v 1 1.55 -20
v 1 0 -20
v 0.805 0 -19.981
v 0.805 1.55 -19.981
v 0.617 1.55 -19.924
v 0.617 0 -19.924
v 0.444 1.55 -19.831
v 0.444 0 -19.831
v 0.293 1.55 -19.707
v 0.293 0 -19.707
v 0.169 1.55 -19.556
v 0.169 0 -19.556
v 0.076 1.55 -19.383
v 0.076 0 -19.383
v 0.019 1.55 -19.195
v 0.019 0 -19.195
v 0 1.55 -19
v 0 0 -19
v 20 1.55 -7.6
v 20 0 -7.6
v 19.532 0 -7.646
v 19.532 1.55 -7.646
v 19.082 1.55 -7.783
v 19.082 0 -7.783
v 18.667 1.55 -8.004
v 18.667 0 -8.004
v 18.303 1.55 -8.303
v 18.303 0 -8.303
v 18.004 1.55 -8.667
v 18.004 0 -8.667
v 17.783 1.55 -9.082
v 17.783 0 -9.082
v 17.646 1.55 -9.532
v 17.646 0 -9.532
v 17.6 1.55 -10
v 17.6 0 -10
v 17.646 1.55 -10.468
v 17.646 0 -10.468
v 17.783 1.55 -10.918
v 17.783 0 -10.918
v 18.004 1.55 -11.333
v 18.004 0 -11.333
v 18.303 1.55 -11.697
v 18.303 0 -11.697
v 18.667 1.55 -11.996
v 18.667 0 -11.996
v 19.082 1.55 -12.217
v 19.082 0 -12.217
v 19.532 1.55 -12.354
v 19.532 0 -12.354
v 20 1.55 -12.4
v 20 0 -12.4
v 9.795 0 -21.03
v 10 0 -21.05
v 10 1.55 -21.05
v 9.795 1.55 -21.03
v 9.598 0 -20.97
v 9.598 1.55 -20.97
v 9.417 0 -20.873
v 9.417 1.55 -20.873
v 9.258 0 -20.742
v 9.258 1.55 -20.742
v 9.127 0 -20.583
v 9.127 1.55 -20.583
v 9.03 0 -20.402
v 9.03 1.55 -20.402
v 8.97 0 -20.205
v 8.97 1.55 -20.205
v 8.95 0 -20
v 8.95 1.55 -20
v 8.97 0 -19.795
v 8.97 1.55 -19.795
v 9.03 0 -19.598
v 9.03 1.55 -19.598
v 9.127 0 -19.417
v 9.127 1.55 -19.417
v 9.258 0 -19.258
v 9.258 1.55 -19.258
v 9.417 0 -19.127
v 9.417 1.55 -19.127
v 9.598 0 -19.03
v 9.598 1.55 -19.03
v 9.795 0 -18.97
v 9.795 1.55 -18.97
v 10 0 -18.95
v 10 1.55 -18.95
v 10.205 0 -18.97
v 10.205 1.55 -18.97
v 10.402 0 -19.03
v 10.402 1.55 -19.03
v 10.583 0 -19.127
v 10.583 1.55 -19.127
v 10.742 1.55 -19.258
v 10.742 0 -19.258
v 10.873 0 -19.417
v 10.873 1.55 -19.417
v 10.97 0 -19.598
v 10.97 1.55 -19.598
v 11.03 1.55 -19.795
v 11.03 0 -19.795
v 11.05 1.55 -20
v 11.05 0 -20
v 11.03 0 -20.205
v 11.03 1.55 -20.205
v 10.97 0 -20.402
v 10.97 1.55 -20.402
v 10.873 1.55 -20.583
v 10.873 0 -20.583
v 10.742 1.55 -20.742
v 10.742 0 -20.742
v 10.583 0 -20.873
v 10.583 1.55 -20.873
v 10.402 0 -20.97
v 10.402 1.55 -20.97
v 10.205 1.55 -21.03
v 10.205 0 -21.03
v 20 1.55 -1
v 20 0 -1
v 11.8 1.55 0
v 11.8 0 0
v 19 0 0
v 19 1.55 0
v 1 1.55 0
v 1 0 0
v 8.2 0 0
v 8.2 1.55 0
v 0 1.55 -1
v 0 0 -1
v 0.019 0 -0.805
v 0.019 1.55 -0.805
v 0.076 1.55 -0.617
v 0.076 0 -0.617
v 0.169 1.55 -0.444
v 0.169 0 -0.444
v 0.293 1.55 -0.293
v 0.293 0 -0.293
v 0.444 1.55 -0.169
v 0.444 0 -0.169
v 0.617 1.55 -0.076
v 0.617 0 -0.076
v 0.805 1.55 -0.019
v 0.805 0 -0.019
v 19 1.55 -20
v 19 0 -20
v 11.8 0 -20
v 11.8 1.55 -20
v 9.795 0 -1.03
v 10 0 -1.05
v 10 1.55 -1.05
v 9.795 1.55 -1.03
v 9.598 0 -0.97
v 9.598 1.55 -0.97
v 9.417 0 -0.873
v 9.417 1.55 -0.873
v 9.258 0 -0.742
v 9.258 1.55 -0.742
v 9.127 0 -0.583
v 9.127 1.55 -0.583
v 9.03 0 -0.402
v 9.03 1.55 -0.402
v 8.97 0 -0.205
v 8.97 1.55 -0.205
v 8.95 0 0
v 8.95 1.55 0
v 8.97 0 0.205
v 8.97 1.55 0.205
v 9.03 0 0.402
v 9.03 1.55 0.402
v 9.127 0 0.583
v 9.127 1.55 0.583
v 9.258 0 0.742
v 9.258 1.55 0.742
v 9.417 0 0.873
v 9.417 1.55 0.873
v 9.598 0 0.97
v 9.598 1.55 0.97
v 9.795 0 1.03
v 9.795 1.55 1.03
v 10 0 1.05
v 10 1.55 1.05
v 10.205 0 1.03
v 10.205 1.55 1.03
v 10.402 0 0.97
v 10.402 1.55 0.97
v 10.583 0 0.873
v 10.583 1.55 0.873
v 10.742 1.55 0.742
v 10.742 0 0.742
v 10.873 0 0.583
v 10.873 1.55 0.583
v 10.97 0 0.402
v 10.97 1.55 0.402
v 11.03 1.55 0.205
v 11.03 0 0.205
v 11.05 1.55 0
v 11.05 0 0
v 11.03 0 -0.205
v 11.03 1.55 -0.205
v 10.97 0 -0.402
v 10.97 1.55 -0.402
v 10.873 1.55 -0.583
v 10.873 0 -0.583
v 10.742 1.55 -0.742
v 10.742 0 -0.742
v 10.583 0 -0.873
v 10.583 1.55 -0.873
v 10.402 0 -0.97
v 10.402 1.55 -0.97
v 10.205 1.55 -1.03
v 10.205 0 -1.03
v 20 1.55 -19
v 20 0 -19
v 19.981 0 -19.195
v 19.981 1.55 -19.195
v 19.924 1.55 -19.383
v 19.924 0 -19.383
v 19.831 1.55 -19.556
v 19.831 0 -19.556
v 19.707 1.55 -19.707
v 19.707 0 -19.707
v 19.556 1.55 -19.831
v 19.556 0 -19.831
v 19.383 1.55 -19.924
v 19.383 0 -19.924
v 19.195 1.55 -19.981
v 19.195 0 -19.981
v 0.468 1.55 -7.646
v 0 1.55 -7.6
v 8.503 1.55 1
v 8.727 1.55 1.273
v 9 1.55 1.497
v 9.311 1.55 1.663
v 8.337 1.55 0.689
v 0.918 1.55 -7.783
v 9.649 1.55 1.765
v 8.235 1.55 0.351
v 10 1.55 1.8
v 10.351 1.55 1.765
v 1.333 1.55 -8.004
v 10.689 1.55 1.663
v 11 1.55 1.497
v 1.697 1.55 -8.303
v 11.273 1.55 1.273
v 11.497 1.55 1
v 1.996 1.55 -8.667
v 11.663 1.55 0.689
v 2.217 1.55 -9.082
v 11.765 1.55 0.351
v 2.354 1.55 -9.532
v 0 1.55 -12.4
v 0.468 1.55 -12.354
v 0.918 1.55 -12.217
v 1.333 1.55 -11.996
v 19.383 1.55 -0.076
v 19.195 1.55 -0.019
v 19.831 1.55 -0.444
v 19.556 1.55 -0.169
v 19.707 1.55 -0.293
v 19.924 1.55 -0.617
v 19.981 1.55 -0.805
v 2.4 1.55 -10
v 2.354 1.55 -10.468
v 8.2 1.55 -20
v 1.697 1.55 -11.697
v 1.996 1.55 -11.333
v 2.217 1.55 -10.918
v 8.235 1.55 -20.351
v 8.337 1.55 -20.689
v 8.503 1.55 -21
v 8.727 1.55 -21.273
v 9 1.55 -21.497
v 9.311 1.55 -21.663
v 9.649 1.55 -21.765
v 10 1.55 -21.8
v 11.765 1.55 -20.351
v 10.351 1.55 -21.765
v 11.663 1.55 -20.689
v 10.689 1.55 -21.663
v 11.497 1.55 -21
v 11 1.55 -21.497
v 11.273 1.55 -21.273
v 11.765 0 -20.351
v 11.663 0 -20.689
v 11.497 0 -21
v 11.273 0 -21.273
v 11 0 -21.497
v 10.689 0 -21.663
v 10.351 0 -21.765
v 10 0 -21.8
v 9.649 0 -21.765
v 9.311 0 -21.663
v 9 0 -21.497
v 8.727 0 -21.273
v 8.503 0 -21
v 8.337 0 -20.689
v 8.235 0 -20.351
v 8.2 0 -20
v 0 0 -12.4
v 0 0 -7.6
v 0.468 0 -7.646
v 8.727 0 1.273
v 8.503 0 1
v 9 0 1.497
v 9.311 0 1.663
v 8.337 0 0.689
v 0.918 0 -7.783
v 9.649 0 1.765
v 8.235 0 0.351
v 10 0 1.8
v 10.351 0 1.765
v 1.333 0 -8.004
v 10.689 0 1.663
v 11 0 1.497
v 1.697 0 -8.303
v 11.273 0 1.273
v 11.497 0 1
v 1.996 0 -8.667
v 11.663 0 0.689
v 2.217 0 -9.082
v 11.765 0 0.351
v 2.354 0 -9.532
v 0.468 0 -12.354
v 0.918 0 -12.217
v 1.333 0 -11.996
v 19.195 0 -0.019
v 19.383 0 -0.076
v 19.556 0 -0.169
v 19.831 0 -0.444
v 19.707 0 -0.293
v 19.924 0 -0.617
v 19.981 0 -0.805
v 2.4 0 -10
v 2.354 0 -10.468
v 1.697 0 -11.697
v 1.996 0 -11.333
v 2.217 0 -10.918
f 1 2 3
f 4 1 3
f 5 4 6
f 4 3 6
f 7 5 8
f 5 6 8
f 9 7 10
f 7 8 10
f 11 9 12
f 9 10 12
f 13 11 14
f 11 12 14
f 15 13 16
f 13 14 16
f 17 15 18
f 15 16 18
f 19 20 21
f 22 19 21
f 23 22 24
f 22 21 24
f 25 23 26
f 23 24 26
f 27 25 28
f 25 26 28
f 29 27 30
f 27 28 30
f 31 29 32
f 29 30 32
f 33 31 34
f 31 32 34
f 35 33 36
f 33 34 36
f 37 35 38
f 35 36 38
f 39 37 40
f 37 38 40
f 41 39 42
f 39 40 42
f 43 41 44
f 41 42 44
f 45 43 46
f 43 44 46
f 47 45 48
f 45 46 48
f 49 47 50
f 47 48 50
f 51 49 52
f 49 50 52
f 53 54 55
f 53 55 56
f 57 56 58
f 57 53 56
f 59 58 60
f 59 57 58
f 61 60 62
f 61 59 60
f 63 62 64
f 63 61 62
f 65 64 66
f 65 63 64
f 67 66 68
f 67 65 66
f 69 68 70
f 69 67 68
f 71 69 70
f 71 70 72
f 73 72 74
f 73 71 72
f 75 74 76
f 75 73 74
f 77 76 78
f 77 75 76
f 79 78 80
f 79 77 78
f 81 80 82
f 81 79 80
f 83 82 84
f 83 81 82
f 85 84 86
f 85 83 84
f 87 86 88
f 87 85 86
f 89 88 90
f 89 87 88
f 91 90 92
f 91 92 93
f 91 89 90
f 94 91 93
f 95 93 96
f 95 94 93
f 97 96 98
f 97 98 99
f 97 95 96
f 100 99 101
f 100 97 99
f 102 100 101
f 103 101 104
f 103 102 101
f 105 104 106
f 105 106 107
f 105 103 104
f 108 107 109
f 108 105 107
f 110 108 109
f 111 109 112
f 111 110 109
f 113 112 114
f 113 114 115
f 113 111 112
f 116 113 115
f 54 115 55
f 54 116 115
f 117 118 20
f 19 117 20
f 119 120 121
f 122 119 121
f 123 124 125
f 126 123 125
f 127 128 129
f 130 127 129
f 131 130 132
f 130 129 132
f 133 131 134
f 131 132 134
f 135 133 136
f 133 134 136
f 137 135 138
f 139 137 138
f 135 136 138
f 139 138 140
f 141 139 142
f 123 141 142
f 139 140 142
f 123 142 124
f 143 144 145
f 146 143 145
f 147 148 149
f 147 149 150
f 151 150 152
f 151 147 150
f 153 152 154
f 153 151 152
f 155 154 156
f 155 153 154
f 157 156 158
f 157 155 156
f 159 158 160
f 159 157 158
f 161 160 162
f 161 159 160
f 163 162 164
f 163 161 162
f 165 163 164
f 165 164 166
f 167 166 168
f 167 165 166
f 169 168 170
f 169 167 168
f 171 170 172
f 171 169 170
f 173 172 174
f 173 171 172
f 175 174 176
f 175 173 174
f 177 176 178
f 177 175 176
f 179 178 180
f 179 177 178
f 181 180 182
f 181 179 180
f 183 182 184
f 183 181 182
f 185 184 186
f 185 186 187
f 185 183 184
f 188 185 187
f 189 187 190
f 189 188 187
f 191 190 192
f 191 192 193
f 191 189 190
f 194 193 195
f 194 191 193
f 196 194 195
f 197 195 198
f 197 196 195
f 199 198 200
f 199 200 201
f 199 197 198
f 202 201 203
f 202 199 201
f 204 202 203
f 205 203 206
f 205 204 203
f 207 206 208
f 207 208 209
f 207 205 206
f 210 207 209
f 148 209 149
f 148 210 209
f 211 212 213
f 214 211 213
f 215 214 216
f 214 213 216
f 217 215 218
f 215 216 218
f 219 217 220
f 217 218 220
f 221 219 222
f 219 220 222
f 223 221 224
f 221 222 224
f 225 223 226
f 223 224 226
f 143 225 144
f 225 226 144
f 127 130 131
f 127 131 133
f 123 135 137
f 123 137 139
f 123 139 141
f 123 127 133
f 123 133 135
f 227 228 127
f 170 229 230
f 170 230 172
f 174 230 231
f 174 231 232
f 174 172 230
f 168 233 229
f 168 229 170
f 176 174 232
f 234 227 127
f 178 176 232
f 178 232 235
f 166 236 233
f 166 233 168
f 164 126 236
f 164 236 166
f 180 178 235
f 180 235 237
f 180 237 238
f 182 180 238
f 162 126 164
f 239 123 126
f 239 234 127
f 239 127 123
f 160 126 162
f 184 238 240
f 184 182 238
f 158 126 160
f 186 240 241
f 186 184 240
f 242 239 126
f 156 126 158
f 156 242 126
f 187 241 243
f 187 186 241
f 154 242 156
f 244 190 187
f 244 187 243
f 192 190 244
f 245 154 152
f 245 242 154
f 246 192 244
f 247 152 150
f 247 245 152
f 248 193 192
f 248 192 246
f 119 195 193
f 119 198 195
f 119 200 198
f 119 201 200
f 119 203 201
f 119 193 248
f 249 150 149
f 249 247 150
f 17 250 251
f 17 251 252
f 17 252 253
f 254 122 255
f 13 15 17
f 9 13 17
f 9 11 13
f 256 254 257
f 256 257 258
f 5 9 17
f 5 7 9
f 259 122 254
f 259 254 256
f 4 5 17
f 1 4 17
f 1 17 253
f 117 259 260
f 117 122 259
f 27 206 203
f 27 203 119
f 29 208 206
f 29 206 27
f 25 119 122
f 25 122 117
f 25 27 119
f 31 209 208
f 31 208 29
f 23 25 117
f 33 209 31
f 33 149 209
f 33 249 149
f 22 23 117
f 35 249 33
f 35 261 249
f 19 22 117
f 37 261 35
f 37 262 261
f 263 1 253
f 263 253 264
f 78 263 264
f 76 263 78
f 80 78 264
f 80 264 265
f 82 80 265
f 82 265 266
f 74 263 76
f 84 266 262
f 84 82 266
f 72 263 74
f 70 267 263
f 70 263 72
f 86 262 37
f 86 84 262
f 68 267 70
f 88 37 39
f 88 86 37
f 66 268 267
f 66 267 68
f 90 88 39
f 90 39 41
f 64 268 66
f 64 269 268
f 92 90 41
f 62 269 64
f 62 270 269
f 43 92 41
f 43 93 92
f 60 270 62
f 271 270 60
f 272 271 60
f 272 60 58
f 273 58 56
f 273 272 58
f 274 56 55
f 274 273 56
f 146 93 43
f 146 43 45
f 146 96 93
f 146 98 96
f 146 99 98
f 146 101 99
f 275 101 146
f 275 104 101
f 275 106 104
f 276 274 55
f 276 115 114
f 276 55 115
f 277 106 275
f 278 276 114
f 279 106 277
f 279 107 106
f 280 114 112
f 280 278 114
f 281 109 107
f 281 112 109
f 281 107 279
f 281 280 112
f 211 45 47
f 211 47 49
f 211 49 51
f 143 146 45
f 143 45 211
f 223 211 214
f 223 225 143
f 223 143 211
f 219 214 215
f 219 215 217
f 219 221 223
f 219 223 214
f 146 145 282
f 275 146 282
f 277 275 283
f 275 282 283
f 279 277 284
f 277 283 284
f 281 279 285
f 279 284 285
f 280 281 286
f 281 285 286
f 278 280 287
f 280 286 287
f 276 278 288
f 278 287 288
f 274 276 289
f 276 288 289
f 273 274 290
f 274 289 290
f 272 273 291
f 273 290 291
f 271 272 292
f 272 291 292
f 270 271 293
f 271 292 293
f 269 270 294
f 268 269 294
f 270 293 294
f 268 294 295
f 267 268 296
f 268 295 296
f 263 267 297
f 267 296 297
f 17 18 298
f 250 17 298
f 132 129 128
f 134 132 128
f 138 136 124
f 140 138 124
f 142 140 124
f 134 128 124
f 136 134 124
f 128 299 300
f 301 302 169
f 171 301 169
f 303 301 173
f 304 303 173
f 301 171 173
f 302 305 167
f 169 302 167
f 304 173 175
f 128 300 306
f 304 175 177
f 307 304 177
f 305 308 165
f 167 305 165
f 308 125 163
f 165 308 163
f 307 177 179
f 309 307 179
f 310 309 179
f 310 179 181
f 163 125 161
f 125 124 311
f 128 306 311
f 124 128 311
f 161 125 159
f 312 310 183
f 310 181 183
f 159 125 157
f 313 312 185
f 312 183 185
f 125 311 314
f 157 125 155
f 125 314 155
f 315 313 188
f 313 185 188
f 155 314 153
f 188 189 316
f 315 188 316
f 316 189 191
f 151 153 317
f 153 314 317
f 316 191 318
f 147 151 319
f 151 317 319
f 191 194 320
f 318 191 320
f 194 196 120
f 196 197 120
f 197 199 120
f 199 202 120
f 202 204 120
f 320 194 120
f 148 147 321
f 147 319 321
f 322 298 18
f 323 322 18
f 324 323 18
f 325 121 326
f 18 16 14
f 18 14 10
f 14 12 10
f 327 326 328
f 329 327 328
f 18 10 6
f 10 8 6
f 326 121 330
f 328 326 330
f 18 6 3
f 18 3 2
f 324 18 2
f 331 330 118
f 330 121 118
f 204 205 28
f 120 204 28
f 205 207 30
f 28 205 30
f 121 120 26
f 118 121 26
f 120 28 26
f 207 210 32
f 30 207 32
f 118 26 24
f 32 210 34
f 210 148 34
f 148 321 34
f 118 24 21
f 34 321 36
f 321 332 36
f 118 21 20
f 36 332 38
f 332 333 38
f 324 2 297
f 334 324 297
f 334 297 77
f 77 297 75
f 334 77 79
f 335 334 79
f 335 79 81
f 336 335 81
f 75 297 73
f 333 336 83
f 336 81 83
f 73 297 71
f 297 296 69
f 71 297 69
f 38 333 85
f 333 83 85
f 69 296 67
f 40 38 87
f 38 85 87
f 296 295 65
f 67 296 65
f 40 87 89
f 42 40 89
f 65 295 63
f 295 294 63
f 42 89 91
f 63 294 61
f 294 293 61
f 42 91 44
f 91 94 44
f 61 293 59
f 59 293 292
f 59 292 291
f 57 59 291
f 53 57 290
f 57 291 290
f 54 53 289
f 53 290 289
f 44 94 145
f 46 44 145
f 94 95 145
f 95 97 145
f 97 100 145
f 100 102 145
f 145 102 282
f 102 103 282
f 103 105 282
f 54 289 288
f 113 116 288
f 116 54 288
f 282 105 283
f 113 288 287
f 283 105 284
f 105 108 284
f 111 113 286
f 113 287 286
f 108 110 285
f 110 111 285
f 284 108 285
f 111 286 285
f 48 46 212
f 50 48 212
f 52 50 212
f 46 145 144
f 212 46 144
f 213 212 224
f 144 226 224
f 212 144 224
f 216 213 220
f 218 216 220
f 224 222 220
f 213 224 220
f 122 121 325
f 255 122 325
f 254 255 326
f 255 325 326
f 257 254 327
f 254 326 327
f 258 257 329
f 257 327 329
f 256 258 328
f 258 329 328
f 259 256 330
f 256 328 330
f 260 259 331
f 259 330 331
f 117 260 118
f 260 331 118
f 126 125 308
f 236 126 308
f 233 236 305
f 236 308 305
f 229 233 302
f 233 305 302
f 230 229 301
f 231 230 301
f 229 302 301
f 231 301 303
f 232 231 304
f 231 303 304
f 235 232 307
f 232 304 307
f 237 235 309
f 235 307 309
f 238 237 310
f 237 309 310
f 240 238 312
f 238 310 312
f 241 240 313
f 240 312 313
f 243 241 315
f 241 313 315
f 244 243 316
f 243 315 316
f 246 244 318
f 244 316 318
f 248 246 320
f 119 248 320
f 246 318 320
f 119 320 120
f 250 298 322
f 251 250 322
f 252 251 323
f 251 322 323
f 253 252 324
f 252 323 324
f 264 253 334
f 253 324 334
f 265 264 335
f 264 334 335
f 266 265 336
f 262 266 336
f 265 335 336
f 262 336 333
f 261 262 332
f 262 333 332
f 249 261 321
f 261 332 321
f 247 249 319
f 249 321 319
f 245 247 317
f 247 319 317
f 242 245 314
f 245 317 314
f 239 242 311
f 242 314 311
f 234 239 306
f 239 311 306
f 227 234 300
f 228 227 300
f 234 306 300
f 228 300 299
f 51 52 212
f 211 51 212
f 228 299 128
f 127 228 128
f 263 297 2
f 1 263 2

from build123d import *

# Parameters (mm, degrees)
ESQUISSE1_R        = 1.05
BOSS_EXTRU_1_DEPTH = 1.55


with BuildPart() as part:
    # Esquisse1 → Boss.-Extru.1 (new body)
    with BuildSketch(Plane(origin=(0, 0, 0), x_dir=(1, 0, 0), z_dir=(0, 1, 0))):
        with BuildLine():
            Line((1, 0), (8.2, 0))
            ThreePointArc((8.2, 0), (10, -1.8), (11.8, 0))
            Line((11.8, 0), (19, 0))
            ThreePointArc((19, 0), (19.707106781, 0.292893219), (20, 1))
            Line((20, 1), (20, 7.6))
            ThreePointArc((20, 7.6), (17.6, 10), (20, 12.4))
            Line((20, 12.4), (20, 19))
            ThreePointArc((20, 19), (19.707106781, 19.707106781), (19, 20))
            Line((19, 20), (11.8, 20))
            ThreePointArc((11.8, 20), (10, 21.8), (8.2, 20))
            Line((8.2, 20), (1, 20))
            ThreePointArc((1, 20), (0.292893219, 19.707106781), (0, 19))
            Line((0, 19), (0, 12.4))
            ThreePointArc((0, 12.4), (2.4, 10), (0, 7.6))
            Line((0, 7.6), (0, 1))
            ThreePointArc((0, 1), (0.292893219, 0.292893219), (1, 0))
        make_face()
        with Locations(Location((10, 0, 0), (0, 0, 90))):
            Circle(ESQUISSE1_R, mode=Mode.SUBTRACT)
        with Locations(Location((10, 20, 0), (0, 0, 90))):
            Circle(ESQUISSE1_R, mode=Mode.SUBTRACT)
    extrude(amount=BOSS_EXTRU_1_DEPTH)


solid = part.part
